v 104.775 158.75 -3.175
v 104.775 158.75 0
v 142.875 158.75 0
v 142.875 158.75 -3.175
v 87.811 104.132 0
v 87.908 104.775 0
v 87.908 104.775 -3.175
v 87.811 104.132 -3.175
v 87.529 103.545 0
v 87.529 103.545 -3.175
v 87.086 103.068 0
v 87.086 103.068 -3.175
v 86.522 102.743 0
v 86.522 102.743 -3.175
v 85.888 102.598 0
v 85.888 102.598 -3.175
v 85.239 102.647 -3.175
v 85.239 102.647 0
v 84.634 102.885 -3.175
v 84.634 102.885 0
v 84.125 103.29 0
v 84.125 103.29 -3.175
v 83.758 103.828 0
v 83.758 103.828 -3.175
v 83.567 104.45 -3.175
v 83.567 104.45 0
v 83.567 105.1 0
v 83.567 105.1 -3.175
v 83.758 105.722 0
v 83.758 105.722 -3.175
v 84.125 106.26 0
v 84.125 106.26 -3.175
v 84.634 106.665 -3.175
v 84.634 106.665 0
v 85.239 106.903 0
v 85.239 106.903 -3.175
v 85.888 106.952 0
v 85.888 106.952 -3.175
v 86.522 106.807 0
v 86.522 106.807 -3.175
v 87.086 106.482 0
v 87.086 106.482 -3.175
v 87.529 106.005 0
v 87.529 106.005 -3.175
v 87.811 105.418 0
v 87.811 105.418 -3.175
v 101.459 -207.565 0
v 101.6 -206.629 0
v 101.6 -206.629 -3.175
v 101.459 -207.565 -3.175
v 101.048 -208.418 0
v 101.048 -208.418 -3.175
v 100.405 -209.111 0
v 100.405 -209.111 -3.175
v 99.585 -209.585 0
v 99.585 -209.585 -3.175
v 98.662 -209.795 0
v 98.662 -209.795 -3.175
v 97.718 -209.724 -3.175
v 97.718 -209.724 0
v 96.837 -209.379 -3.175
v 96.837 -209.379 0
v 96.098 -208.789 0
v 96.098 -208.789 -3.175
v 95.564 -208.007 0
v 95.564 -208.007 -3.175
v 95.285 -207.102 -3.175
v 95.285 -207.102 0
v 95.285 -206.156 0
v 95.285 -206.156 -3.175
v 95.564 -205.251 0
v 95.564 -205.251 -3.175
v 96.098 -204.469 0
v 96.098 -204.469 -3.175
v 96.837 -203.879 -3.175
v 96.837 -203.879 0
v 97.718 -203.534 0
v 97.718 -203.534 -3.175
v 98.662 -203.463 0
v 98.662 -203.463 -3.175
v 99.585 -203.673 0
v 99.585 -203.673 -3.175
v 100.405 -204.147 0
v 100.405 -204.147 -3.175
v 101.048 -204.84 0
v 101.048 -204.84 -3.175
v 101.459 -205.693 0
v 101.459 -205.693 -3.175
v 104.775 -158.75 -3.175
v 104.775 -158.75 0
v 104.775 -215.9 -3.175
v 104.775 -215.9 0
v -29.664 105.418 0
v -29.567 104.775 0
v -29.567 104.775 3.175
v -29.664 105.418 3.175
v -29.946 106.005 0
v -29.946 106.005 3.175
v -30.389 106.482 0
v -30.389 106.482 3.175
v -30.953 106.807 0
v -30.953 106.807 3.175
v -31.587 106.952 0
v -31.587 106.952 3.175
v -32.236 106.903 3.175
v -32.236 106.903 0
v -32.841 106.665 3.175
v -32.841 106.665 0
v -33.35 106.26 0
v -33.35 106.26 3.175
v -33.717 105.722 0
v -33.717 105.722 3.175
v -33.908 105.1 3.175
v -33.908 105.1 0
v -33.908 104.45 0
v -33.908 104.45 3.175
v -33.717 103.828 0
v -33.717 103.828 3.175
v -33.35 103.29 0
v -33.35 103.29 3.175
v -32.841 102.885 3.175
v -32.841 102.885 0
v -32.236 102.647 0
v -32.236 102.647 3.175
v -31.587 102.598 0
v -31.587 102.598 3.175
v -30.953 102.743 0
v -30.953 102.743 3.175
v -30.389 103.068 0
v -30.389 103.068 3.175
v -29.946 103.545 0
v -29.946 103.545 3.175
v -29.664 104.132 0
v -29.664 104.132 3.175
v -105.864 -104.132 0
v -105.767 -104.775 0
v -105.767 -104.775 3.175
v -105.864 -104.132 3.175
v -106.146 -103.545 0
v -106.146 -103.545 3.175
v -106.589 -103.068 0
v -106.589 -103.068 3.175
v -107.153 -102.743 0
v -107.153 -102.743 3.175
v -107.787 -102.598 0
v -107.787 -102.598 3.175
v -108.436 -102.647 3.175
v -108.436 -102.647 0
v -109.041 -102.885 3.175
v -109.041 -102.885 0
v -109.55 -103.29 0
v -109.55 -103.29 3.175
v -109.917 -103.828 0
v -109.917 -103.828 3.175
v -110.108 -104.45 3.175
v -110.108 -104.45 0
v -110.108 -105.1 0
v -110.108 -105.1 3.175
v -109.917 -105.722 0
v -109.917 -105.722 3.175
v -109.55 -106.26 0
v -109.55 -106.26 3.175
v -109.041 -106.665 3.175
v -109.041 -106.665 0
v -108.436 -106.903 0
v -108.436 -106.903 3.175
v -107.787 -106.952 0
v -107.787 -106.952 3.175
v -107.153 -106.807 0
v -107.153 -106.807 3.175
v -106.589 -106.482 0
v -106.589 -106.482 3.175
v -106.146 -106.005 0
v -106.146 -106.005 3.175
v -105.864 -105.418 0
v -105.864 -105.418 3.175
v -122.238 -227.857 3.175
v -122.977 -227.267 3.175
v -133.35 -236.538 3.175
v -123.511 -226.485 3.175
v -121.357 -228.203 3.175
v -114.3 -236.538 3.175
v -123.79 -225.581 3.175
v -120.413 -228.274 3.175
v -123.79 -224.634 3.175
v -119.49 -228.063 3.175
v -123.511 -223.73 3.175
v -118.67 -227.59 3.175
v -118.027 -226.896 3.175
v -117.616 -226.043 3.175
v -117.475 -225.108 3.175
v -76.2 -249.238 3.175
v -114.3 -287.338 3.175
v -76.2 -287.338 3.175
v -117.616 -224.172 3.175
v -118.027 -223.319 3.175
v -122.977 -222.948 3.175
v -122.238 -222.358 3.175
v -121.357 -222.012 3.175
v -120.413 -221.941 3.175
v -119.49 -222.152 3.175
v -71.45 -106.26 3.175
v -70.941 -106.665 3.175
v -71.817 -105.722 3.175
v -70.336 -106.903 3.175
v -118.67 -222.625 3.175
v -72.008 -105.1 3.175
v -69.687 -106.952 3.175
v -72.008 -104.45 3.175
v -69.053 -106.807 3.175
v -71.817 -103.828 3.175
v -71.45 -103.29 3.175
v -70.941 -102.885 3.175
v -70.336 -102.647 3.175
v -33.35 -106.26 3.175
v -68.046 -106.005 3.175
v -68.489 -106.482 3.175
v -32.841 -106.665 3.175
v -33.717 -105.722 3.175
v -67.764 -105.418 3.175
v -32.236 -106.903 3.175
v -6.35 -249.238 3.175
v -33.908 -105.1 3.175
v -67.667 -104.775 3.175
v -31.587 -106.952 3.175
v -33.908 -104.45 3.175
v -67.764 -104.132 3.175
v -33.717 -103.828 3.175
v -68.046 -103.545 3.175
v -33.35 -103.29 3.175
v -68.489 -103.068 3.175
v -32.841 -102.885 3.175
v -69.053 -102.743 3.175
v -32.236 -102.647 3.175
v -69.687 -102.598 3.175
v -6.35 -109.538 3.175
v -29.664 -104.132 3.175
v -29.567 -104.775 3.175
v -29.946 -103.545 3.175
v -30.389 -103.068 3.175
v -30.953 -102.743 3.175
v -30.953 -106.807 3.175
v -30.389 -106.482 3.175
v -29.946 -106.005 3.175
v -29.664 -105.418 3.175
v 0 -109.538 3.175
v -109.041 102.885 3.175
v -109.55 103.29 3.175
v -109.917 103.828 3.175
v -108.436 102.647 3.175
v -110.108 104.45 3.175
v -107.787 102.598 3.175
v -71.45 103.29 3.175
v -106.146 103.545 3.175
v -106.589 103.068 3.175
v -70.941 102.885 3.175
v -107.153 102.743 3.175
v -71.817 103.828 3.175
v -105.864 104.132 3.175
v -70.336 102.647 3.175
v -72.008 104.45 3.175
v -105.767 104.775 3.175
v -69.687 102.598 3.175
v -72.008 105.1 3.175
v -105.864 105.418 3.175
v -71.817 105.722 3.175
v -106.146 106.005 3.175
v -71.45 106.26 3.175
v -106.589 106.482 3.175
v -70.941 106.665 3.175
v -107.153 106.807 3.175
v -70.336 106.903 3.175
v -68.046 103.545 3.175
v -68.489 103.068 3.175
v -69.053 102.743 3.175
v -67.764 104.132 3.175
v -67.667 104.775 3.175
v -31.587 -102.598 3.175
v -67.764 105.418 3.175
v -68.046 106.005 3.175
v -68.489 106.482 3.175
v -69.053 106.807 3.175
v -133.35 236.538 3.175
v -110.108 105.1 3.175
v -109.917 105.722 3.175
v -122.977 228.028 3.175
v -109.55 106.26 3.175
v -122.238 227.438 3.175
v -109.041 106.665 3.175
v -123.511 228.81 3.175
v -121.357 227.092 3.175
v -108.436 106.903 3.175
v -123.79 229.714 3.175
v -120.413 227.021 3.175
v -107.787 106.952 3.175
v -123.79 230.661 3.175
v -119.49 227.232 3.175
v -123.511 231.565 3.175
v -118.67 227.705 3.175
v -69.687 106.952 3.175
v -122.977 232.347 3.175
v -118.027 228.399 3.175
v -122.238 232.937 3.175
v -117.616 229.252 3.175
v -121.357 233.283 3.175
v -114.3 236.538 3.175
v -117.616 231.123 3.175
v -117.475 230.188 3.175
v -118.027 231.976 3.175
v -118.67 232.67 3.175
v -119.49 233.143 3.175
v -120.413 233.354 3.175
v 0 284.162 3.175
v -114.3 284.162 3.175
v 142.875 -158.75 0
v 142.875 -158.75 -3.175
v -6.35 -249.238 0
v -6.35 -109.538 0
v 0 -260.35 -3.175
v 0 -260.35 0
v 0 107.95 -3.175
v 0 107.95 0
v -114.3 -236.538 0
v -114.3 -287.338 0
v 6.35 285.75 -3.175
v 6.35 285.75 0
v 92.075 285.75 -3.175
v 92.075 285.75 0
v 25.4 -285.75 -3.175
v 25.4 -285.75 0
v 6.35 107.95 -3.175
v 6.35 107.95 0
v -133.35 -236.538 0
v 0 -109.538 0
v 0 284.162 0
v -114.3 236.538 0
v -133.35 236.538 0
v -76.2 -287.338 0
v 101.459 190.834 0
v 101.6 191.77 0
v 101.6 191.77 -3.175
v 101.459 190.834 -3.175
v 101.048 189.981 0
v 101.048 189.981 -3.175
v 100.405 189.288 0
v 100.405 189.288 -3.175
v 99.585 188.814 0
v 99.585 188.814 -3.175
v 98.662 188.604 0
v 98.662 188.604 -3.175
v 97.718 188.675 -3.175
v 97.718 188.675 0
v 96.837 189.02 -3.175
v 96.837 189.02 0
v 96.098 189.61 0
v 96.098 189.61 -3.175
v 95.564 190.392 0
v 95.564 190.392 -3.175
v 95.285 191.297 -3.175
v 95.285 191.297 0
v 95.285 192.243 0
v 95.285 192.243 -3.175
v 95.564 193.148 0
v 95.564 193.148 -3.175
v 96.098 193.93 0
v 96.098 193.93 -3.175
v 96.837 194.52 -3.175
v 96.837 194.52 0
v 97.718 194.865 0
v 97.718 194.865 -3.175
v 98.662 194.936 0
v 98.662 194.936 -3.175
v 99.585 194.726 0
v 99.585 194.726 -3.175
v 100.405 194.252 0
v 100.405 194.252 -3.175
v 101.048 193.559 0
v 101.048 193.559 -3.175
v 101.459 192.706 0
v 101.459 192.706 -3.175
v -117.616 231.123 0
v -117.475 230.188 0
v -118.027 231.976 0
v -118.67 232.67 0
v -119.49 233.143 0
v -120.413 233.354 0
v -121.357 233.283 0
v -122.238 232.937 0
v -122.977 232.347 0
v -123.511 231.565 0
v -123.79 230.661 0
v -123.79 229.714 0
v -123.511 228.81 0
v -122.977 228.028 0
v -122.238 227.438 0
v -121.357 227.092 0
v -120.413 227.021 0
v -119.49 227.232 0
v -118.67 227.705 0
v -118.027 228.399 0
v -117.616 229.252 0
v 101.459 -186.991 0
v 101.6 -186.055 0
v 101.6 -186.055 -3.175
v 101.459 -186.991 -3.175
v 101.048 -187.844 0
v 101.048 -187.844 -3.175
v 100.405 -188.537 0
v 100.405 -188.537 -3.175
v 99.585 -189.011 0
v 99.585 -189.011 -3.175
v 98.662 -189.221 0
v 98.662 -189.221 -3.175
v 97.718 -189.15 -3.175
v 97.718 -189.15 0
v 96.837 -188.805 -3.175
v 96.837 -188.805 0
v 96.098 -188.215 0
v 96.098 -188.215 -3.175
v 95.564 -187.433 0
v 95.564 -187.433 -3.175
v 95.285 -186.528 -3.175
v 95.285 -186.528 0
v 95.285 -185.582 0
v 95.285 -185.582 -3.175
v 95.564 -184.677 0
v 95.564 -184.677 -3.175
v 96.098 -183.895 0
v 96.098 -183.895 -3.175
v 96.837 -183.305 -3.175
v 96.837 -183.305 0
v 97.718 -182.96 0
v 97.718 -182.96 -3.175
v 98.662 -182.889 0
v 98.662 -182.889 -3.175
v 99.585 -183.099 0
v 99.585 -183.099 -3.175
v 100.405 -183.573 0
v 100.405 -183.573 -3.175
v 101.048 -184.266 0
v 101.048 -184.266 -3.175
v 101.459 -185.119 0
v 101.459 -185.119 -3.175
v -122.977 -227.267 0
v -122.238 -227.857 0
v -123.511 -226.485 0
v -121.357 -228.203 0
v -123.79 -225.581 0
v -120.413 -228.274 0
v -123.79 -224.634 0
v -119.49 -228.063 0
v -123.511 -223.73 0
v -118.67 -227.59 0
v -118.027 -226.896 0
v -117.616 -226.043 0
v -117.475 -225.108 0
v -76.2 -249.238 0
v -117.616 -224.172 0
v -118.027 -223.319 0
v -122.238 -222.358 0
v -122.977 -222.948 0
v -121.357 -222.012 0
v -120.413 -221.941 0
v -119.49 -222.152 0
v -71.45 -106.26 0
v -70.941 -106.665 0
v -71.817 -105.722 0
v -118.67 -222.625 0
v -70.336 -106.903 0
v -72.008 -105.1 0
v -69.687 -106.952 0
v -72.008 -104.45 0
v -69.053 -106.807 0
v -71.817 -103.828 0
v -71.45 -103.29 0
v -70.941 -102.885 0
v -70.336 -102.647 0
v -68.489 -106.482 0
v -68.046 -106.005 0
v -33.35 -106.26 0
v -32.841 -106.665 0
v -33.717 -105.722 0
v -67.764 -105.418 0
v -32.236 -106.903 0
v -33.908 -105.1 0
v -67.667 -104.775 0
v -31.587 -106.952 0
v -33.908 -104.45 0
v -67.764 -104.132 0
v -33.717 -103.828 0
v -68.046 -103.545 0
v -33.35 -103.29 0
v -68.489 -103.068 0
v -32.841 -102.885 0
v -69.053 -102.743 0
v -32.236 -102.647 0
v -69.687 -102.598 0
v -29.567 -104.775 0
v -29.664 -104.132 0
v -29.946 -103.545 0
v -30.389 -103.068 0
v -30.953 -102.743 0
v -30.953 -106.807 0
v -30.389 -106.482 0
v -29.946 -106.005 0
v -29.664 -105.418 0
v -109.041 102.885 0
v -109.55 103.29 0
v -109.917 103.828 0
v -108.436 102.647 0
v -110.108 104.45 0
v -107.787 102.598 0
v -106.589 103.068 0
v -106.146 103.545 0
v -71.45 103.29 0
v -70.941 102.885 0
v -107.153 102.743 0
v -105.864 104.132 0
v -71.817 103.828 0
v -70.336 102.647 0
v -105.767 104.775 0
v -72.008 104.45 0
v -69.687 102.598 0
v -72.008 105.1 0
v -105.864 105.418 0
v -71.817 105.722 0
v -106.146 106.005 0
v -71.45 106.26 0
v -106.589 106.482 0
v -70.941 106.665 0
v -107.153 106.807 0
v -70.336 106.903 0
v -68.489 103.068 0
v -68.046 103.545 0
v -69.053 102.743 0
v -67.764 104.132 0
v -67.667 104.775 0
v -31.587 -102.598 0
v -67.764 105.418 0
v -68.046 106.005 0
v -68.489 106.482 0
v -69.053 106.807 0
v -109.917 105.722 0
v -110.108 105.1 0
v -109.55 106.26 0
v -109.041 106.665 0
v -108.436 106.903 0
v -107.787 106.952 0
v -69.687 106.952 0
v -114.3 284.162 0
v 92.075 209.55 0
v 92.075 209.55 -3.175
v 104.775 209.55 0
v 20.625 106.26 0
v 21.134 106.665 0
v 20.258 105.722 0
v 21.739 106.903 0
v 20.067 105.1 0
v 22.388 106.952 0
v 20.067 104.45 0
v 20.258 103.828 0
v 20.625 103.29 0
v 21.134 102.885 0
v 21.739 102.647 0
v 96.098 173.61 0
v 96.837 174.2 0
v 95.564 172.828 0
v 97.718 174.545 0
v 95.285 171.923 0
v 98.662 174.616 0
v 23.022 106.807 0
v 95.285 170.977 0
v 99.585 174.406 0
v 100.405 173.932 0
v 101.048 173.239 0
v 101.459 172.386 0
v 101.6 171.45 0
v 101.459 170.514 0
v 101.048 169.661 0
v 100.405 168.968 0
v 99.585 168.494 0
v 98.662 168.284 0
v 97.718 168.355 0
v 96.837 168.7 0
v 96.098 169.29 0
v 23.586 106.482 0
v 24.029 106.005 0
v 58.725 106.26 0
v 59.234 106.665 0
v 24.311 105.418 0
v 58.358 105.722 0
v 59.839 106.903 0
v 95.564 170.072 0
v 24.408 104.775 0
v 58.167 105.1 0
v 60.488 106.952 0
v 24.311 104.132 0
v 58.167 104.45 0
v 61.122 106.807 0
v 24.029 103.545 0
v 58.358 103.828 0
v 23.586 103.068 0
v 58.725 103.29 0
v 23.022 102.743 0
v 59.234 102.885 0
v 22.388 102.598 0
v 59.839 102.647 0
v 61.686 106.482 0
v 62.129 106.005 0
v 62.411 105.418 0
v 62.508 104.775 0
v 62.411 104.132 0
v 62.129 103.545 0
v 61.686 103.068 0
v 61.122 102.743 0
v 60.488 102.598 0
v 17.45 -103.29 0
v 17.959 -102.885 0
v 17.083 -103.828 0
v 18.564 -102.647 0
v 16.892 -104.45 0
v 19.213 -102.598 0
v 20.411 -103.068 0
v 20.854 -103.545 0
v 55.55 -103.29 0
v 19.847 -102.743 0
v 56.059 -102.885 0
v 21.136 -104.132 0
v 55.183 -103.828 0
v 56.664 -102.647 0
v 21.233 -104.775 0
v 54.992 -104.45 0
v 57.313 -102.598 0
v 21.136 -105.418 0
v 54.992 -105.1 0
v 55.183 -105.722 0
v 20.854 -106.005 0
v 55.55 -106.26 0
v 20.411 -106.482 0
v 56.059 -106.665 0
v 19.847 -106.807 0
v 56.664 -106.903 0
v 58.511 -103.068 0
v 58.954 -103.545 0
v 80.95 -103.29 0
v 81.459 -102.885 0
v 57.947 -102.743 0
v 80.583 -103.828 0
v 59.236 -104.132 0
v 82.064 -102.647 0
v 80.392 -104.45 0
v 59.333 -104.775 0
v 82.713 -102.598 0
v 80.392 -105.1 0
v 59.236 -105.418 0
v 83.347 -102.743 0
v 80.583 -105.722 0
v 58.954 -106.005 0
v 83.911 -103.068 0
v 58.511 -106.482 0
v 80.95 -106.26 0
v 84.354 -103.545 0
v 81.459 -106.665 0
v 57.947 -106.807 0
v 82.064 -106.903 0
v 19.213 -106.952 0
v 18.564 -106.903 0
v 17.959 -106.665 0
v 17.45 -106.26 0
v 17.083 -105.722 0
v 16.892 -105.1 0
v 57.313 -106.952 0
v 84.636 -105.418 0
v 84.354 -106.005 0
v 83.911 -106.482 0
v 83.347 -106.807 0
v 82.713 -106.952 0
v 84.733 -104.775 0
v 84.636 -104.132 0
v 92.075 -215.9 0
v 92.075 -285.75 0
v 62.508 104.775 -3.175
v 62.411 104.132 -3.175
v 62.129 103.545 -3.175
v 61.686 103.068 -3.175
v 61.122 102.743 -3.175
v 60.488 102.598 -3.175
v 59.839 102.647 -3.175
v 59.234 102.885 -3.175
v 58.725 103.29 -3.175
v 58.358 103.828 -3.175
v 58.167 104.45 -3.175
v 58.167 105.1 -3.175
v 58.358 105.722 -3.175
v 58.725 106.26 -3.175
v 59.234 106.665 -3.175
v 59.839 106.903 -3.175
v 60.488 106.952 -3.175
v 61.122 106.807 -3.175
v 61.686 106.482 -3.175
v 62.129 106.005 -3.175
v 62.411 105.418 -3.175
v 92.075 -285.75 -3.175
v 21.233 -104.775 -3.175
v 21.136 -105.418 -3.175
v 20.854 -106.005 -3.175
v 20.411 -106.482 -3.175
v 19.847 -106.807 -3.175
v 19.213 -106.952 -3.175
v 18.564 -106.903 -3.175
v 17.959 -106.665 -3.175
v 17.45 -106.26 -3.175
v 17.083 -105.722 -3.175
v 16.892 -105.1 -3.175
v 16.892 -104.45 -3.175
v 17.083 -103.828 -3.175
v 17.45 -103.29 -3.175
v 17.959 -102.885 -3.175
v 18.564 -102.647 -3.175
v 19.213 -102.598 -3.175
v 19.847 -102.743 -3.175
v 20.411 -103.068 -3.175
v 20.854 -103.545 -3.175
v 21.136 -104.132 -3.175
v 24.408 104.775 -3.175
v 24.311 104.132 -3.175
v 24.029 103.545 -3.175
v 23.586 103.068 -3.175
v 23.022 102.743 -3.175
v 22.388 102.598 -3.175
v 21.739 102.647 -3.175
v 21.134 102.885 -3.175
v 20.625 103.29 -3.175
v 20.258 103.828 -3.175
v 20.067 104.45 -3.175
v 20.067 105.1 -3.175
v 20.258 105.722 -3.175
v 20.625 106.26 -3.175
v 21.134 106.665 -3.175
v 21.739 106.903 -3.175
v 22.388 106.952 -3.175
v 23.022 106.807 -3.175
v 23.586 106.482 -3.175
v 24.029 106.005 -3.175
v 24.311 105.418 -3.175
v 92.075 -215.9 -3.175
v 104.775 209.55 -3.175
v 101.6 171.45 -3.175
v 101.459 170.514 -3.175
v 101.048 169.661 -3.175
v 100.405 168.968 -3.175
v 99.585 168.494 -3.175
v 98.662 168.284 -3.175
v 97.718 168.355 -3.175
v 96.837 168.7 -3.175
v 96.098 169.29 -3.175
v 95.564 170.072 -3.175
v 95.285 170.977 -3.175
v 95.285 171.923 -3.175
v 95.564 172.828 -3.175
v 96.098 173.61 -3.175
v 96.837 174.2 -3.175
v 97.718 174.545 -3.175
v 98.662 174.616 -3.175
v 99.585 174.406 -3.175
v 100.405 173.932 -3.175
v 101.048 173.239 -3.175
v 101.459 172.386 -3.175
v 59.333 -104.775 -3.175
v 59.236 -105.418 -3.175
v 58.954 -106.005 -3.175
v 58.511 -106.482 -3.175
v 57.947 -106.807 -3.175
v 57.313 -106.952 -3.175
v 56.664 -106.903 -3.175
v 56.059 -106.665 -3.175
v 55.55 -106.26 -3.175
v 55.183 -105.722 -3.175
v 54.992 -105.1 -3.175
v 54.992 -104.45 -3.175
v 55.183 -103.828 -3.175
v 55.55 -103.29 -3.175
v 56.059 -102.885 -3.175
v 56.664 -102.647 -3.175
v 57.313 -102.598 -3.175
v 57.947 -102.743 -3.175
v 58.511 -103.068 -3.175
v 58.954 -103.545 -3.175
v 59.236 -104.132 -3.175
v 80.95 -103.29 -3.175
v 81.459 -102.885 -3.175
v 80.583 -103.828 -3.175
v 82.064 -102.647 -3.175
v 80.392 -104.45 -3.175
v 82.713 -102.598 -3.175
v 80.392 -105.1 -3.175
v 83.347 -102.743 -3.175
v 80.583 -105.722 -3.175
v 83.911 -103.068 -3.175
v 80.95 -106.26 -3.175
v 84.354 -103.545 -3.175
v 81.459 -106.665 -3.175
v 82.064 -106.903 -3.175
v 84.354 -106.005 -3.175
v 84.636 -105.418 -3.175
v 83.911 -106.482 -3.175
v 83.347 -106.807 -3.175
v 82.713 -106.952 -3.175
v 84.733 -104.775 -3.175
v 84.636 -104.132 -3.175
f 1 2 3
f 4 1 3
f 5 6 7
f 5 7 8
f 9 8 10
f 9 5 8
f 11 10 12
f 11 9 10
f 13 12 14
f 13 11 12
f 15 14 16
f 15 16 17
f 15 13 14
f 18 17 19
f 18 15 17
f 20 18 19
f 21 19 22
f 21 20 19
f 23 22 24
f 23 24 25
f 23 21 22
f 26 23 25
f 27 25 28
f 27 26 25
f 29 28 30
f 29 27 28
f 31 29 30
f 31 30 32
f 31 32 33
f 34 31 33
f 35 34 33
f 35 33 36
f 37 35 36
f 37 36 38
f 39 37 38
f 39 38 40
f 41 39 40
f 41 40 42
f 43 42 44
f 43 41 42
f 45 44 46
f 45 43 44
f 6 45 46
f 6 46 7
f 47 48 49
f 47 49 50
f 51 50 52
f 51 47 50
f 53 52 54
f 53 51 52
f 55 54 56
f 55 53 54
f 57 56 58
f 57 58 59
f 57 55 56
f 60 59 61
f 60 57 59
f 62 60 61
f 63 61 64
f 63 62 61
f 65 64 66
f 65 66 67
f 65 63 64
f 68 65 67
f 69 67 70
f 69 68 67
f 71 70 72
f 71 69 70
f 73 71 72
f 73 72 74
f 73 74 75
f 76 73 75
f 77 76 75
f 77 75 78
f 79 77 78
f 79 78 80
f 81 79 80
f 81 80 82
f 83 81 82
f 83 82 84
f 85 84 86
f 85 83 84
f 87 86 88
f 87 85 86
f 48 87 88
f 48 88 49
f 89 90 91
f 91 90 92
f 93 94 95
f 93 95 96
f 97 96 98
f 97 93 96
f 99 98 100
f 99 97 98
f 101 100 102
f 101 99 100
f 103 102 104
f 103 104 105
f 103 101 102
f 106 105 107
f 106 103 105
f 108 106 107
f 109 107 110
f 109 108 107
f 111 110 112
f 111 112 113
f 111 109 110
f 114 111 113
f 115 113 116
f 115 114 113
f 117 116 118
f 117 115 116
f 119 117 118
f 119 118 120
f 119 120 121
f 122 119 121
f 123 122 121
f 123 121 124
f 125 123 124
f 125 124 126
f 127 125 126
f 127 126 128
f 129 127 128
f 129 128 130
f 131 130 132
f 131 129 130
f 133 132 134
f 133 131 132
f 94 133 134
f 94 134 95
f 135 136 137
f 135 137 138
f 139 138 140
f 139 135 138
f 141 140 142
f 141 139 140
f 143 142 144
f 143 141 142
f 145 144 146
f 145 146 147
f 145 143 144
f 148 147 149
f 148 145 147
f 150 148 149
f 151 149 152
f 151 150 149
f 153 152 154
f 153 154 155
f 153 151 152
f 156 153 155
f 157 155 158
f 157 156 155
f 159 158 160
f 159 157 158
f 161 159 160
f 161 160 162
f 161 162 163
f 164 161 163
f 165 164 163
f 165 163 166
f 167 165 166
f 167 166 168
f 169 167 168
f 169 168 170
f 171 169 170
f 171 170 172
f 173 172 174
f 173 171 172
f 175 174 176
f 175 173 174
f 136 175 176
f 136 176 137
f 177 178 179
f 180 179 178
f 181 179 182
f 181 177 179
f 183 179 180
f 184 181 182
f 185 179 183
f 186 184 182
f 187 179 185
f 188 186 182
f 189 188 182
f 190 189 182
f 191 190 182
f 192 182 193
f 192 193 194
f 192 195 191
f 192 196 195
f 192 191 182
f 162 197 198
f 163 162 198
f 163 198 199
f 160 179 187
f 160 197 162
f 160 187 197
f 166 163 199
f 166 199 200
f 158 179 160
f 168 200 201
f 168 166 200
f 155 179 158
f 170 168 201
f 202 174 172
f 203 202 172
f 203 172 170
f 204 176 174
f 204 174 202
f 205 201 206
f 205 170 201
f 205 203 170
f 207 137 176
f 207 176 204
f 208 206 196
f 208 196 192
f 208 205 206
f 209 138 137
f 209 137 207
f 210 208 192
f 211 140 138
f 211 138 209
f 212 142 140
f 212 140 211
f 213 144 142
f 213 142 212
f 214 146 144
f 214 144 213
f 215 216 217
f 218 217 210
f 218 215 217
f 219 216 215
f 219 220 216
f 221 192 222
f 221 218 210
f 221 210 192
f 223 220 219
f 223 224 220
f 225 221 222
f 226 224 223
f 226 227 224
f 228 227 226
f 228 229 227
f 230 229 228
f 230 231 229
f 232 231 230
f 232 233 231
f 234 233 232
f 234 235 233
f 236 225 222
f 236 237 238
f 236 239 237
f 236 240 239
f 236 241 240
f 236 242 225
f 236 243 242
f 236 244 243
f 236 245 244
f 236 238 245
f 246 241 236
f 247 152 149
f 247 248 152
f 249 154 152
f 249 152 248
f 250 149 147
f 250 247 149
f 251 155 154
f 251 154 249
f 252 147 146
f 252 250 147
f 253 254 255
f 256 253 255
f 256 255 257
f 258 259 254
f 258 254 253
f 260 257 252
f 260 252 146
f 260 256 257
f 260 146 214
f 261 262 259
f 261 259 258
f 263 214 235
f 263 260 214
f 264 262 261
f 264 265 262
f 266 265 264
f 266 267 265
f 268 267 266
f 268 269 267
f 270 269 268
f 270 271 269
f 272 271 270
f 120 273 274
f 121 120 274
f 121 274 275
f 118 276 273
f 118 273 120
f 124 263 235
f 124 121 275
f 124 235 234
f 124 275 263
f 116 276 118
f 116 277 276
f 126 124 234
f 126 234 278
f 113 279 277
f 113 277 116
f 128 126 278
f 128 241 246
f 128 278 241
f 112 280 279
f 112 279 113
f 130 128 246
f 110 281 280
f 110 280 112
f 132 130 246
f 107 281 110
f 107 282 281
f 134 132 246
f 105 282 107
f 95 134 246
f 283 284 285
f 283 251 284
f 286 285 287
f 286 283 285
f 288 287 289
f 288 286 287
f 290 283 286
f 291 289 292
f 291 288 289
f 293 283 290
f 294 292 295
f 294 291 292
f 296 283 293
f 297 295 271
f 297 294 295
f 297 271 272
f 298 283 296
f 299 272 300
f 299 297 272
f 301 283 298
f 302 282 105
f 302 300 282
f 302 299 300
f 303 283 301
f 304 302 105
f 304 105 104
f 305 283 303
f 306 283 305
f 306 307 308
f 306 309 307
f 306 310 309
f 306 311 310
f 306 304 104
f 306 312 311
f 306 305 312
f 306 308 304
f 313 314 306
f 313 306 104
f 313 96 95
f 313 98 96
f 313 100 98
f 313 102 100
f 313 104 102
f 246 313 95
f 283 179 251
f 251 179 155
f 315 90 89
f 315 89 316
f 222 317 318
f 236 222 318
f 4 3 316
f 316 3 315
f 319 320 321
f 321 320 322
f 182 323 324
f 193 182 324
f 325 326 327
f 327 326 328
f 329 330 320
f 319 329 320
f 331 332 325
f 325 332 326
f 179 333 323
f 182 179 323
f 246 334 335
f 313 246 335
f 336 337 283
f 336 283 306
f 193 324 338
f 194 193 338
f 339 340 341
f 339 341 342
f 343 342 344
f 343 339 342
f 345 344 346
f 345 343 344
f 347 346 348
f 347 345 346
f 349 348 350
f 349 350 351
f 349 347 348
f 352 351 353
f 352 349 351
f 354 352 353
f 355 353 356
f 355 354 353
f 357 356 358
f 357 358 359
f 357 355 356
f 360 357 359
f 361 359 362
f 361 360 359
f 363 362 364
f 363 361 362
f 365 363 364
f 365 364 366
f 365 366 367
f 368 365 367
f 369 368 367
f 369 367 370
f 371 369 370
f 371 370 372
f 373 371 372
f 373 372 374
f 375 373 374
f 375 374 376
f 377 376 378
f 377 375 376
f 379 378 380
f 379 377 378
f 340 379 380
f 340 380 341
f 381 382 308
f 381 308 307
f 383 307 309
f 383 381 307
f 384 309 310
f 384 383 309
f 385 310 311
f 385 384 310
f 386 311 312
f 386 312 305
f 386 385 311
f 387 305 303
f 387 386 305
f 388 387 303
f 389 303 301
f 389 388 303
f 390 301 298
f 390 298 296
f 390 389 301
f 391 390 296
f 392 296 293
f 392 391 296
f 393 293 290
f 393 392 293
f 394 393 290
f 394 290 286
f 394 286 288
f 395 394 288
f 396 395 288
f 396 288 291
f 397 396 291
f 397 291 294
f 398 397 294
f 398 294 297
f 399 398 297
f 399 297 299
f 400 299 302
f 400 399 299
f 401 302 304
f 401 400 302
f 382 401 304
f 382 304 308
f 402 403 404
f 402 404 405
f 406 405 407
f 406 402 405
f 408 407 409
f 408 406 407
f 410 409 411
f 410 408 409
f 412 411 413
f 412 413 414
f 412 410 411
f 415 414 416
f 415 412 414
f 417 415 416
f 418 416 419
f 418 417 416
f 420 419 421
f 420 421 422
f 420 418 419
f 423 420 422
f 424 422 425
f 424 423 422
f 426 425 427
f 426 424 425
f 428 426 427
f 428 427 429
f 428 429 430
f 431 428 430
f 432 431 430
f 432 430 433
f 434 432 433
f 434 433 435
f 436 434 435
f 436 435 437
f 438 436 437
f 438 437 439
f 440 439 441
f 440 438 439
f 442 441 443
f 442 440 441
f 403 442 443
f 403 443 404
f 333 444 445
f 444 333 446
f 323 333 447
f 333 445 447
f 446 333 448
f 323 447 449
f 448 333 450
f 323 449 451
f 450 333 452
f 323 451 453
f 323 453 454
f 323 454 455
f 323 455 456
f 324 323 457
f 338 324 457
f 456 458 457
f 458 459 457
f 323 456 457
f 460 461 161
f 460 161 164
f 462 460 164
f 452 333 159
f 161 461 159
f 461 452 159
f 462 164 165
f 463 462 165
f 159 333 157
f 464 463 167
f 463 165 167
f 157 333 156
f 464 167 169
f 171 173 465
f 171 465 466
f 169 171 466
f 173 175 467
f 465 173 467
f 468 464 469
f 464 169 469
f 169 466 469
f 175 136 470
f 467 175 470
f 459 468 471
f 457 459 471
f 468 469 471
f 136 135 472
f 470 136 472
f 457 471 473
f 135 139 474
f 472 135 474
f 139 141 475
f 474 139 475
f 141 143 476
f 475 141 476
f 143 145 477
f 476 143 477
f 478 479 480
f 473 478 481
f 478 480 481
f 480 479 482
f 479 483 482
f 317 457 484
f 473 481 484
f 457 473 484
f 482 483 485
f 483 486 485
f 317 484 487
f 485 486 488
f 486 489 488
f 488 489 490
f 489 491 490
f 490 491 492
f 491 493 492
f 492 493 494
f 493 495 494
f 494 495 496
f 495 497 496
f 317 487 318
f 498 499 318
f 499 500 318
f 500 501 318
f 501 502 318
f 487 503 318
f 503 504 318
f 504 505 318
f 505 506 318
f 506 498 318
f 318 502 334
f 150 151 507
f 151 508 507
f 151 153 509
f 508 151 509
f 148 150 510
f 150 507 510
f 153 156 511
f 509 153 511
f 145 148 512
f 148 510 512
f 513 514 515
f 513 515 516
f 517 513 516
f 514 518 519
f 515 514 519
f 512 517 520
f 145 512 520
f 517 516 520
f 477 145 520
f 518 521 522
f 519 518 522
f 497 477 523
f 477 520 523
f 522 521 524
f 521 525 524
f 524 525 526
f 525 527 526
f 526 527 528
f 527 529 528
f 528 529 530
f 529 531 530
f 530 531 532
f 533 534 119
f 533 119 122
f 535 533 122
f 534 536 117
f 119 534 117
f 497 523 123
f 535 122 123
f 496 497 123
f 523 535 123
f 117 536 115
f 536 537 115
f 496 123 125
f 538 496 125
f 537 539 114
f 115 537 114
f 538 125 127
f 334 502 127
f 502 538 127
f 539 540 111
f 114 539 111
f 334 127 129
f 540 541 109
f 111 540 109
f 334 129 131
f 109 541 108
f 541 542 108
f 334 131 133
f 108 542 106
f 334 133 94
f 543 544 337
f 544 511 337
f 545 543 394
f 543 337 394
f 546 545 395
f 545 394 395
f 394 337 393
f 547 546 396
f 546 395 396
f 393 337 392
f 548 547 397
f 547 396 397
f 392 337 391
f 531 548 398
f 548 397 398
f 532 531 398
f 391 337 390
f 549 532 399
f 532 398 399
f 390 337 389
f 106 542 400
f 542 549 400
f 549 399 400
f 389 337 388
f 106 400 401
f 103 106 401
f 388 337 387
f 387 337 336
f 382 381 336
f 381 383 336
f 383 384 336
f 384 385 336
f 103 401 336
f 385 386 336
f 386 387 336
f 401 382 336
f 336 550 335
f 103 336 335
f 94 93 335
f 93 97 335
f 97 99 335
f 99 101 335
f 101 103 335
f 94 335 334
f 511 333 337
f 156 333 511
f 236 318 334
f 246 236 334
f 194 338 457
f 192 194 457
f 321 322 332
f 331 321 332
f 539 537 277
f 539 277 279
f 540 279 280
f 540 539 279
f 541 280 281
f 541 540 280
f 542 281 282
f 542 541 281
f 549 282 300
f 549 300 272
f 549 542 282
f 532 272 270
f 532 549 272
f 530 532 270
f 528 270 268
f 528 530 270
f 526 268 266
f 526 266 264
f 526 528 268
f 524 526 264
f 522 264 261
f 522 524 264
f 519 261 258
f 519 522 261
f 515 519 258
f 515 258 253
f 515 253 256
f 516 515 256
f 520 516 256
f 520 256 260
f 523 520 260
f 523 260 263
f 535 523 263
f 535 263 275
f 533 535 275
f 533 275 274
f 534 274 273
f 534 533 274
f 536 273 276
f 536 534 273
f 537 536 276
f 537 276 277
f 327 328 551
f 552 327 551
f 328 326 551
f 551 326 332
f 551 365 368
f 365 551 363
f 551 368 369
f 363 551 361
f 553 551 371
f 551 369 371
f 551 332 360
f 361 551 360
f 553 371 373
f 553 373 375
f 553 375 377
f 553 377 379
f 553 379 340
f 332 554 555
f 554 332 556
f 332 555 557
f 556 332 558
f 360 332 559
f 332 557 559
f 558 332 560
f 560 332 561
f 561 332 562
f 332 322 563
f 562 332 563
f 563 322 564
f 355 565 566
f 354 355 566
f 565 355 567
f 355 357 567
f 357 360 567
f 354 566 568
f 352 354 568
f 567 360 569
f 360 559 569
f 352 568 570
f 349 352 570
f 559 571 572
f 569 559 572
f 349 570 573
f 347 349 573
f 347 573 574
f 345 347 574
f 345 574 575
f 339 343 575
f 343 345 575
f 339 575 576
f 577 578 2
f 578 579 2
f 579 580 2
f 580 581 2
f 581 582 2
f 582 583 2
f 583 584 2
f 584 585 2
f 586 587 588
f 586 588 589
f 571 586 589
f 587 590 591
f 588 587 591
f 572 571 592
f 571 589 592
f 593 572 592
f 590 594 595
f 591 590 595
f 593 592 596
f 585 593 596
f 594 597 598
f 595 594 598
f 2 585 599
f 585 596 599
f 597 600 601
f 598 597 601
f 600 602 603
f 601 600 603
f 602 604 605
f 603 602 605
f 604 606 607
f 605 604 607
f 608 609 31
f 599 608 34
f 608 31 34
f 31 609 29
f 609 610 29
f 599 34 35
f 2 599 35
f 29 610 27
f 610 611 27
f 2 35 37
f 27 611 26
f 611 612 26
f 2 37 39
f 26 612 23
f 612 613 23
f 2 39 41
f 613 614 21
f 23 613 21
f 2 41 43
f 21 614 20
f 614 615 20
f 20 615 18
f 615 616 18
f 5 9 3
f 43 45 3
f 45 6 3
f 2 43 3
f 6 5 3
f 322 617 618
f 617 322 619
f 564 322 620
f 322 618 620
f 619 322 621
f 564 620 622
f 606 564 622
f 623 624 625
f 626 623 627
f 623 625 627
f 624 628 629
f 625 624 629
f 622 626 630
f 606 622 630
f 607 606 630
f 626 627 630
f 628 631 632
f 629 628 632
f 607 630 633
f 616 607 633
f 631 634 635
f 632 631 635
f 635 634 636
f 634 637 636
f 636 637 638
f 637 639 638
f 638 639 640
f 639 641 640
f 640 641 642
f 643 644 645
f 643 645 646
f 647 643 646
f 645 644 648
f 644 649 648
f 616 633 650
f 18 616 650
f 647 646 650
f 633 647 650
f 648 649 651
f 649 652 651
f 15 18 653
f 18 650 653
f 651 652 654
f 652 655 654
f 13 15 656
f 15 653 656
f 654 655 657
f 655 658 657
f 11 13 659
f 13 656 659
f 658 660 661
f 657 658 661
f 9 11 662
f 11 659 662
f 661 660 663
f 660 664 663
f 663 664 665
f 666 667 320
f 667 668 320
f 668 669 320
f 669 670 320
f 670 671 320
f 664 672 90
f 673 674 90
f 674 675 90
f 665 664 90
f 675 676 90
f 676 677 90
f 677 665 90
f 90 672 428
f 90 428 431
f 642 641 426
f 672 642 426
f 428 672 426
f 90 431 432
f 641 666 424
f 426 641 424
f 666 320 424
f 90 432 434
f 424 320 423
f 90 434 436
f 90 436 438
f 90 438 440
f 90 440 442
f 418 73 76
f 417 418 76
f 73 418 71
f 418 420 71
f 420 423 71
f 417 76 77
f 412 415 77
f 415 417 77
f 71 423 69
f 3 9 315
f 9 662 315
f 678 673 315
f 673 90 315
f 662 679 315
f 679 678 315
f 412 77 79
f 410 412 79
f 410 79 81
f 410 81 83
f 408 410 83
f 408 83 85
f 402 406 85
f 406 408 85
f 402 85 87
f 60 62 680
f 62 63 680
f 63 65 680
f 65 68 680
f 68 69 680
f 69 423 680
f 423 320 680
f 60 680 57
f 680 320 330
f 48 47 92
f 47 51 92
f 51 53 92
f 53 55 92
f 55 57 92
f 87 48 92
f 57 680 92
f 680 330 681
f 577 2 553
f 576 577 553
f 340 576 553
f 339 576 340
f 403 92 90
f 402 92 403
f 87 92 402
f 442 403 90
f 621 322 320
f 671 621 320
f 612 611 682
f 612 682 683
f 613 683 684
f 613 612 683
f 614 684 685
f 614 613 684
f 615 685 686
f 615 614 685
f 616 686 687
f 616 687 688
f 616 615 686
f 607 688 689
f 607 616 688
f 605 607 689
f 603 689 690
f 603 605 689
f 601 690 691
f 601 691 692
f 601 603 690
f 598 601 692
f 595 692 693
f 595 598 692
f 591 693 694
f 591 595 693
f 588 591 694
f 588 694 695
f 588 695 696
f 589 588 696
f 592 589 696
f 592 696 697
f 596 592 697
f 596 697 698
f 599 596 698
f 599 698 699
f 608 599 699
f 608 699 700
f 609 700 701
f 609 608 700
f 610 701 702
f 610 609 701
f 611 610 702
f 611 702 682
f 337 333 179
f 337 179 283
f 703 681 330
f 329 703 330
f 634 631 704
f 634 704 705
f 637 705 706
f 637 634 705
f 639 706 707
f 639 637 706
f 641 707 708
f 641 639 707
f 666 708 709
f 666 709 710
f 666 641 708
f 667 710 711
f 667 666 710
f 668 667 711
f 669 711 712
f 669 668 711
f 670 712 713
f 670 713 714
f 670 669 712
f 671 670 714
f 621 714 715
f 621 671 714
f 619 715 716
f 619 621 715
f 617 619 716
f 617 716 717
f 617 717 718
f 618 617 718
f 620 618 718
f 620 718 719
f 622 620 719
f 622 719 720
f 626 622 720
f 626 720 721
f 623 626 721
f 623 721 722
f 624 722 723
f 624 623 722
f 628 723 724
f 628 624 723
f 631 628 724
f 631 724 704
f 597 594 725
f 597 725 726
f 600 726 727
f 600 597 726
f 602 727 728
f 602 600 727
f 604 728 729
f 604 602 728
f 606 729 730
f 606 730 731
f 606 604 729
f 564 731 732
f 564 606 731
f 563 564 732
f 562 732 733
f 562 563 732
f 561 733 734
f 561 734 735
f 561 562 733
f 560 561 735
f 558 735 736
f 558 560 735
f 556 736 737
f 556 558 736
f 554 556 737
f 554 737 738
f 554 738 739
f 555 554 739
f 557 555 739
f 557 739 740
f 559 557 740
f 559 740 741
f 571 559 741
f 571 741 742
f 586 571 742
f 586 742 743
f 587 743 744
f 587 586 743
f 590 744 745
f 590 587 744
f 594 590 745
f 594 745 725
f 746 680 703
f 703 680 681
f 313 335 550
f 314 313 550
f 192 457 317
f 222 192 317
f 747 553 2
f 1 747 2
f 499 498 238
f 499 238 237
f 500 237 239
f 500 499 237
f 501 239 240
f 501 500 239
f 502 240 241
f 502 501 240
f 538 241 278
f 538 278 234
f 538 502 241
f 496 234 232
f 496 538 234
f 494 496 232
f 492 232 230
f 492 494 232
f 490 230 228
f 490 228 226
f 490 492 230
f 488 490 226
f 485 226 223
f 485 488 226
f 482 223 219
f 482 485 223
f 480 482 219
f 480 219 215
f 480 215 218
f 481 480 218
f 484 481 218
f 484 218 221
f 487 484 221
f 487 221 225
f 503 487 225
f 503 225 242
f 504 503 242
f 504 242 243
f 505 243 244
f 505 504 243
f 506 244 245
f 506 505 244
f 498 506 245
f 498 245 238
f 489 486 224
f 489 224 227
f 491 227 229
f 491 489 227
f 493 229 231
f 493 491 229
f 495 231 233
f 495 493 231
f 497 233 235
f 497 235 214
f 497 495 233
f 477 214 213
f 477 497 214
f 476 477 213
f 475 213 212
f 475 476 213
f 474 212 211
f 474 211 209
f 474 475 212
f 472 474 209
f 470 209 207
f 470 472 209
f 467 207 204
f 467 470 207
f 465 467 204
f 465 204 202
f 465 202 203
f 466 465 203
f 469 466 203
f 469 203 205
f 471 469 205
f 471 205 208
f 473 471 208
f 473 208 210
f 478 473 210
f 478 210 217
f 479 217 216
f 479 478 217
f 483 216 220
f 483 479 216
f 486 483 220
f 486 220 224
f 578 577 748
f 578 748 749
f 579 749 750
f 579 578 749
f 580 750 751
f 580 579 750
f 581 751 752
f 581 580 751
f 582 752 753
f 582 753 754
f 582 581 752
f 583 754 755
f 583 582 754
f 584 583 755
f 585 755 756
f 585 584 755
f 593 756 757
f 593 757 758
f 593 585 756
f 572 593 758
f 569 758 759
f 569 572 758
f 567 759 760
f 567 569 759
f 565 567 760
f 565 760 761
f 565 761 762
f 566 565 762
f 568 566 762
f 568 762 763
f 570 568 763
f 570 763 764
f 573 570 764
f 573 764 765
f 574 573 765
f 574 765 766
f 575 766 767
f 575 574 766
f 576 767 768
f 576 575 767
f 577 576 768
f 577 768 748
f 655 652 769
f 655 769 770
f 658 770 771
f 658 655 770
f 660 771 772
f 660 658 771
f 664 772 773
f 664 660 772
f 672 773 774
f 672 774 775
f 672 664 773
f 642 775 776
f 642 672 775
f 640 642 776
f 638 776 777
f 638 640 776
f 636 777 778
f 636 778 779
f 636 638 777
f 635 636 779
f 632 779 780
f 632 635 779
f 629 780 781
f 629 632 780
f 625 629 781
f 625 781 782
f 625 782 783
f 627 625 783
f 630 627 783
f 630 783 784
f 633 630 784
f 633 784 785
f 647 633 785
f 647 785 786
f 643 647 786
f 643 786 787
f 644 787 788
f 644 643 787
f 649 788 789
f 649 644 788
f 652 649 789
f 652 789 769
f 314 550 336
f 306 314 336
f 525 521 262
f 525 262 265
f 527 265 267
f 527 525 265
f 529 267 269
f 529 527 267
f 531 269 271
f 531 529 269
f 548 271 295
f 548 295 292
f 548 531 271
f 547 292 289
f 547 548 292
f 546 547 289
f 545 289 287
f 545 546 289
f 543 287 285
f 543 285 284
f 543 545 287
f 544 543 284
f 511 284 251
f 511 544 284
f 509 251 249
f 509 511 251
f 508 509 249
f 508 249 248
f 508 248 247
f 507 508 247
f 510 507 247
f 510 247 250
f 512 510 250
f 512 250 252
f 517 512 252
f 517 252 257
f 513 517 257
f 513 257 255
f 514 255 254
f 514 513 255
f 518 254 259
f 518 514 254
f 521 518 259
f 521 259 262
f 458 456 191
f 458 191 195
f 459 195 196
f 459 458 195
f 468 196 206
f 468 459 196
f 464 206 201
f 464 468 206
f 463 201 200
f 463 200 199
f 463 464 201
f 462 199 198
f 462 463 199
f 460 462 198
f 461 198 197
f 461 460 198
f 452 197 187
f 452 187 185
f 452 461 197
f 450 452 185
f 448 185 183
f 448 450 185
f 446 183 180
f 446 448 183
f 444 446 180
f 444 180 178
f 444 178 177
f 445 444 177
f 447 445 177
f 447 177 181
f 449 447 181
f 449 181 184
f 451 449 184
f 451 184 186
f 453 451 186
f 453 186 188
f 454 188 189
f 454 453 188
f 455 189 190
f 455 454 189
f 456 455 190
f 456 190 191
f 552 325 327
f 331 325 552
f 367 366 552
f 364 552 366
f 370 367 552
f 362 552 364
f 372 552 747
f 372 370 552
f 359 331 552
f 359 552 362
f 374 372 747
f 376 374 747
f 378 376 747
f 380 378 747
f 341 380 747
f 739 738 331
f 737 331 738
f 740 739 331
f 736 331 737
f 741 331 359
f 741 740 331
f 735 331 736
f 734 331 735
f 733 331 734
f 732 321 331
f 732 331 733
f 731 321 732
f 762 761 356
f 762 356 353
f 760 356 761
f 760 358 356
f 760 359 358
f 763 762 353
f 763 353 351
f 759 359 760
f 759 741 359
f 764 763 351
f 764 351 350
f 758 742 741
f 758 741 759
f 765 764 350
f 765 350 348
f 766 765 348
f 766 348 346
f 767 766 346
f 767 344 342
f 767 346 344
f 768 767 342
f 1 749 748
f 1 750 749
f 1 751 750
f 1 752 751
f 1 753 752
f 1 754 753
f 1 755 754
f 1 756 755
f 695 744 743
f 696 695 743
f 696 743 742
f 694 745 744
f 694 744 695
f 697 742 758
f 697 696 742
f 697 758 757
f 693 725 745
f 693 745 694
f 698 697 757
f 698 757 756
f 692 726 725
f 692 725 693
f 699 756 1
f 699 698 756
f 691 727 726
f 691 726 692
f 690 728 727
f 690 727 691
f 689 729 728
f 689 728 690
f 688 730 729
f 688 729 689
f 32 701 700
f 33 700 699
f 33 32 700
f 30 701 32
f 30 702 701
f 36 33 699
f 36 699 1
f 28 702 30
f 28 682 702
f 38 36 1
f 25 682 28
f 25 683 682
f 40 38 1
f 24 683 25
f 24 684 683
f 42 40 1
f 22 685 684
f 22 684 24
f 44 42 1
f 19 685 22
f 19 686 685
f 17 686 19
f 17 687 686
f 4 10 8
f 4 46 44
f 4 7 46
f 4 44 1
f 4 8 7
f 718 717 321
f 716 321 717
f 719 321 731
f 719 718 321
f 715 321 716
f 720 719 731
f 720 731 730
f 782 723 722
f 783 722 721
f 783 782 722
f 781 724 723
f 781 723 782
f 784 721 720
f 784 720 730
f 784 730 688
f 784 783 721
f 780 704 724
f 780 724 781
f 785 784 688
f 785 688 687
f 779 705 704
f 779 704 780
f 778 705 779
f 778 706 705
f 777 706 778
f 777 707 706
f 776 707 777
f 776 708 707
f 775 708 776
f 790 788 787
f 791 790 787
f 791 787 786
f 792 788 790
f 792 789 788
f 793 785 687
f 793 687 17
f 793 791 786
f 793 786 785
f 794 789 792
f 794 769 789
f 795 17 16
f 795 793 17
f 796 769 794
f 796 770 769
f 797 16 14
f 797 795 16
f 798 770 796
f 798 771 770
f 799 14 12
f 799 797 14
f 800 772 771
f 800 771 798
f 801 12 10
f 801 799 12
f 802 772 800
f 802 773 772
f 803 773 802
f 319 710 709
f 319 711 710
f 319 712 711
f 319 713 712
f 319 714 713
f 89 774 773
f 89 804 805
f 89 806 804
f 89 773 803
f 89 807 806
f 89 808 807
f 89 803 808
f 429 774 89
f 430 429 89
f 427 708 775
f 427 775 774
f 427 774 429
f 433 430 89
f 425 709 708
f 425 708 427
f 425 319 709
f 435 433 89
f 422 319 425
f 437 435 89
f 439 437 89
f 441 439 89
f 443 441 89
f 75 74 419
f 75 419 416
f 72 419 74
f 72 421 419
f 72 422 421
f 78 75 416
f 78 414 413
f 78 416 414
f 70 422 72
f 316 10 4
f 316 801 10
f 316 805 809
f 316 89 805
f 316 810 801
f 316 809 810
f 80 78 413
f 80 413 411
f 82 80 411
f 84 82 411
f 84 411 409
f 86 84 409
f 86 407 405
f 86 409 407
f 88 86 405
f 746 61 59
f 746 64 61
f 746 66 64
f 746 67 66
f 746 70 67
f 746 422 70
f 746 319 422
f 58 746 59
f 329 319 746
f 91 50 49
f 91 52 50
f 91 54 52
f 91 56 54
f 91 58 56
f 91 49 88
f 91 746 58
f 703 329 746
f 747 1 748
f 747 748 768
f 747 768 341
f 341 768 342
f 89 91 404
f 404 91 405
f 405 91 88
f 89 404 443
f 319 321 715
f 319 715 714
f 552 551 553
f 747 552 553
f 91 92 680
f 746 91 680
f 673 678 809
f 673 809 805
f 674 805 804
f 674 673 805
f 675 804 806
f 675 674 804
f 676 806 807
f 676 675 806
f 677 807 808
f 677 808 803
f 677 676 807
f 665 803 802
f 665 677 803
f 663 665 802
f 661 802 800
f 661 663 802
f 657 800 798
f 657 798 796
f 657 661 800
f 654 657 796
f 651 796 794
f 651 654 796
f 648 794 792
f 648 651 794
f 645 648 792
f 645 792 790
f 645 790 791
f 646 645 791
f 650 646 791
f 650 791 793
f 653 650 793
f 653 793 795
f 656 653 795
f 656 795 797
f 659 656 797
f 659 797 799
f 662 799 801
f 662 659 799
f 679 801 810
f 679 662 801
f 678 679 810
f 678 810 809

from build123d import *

# Parameters (mm, degrees)
F0_R     = 2.1828125
F0_W     = 19.05
F0_H     = 473.075
F0_R_2   = 3.175
F1_DEPTH = 3.175
F2_R     = 2.1828125
F2_R_2   = 3.175
F2_W     = 38.1
F2_H     = 158.75
F3_DEPTH = 3.175


# Not quite as in the source:
# - a feature names something its author has since deleted; it is built from what else it names


with BuildPart() as f1:
    # F0 (on Top) → F1 (new body)
    with BuildSketch(Plane.XY):
        Polygon((0, 284.1625), (-114.3, 284.1625), (-114.3, 236.5375), (-114.3, -236.5375), (-114.3, -287.3375), (-76.2, -287.3375), (-76.2, -249.2375), (-6.35, -249.2375), (-6.35, -109.5375), (0, -109.5375), align=None)
        with Locations((-107.95, -104.775)):
            Circle(F0_R, mode=Mode.SUBTRACT)
        with Locations((-69.85, -104.775)):
            Circle(F0_R, mode=Mode.SUBTRACT)
        with Locations((-31.75, -104.775)):
            Circle(F0_R, mode=Mode.SUBTRACT)
        with Locations((-107.95, 104.775)):
            Circle(F0_R, mode=Mode.SUBTRACT)
        with Locations((-69.85, 104.775)):
            Circle(F0_R, mode=Mode.SUBTRACT)
        with Locations((-31.75, 104.775)):
            Circle(F0_R, mode=Mode.SUBTRACT)
        with Locations((-123.825, 0)):
            Rectangle(F0_W, F0_H)
        with Locations((-120.65, -225.1075)):
            Circle(F0_R_2, mode=Mode.SUBTRACT)
        with Locations((-120.65, 230.1875)):
            Circle(F0_R_2, mode=Mode.SUBTRACT)
    extrude(amount=F1_DEPTH)


with BuildPart() as f3:
    # F2 (on face) → F3 (new body)
    with BuildSketch(Plane(origin=(0, 0, 0), x_dir=(1, 0, 0), z_dir=(0, 0, -1))):
        Polygon((6.35, -107.95), (6.35, -285.75), (92.075, -285.75), (92.075, -209.55), (92.075, 0), (92.075, 215.9), (92.075, 285.75), (25.4, 285.75), (0, 260.35), (0, 109.5375), (0, -107.95), align=None)
        with Locations((22.225, -104.775)):
            Circle(F2_R, mode=Mode.SUBTRACT)
        with Locations((60.325, -104.775)):
            Circle(F2_R, mode=Mode.SUBTRACT)
        with Locations((85.725, -104.775)):
            Circle(F2_R, mode=Mode.SUBTRACT)
        with Locations((19.05, 104.775)):
            Circle(F2_R, mode=Mode.SUBTRACT)
        with Locations((57.15, 104.775)):
            Circle(F2_R, mode=Mode.SUBTRACT)
        with Locations((82.55, 104.775)):
            Circle(F2_R, mode=Mode.SUBTRACT)
        Polygon((92.075, 0), (92.075, -209.55), (104.775, -209.55), (104.775, -158.75), (104.775, 0), align=None)
        with Locations((98.425, -191.77)):
            Circle(F2_R_2, mode=Mode.SUBTRACT)
        with Locations((98.425, -171.45)):
            Circle(F2_R_2, mode=Mode.SUBTRACT)
        Polygon((92.075, 215.9), (92.075, 0), (104.775, 0), (104.775, 158.75), (104.775, 215.9), align=None)
        with Locations((98.425, 186.055)):
            Circle(F2_R_2, mode=Mode.SUBTRACT)
        with Locations((98.425, 206.629)):
            Circle(F2_R_2, mode=Mode.SUBTRACT)
        with Locations((123.825, -79.375)):
            Rectangle(F2_W, F2_H)
        with Locations((123.825, 79.375)):
            Rectangle(F2_W, F2_H)
    extrude(amount=F3_DEPTH)


solid = Compound([f1.part, f3.part])
